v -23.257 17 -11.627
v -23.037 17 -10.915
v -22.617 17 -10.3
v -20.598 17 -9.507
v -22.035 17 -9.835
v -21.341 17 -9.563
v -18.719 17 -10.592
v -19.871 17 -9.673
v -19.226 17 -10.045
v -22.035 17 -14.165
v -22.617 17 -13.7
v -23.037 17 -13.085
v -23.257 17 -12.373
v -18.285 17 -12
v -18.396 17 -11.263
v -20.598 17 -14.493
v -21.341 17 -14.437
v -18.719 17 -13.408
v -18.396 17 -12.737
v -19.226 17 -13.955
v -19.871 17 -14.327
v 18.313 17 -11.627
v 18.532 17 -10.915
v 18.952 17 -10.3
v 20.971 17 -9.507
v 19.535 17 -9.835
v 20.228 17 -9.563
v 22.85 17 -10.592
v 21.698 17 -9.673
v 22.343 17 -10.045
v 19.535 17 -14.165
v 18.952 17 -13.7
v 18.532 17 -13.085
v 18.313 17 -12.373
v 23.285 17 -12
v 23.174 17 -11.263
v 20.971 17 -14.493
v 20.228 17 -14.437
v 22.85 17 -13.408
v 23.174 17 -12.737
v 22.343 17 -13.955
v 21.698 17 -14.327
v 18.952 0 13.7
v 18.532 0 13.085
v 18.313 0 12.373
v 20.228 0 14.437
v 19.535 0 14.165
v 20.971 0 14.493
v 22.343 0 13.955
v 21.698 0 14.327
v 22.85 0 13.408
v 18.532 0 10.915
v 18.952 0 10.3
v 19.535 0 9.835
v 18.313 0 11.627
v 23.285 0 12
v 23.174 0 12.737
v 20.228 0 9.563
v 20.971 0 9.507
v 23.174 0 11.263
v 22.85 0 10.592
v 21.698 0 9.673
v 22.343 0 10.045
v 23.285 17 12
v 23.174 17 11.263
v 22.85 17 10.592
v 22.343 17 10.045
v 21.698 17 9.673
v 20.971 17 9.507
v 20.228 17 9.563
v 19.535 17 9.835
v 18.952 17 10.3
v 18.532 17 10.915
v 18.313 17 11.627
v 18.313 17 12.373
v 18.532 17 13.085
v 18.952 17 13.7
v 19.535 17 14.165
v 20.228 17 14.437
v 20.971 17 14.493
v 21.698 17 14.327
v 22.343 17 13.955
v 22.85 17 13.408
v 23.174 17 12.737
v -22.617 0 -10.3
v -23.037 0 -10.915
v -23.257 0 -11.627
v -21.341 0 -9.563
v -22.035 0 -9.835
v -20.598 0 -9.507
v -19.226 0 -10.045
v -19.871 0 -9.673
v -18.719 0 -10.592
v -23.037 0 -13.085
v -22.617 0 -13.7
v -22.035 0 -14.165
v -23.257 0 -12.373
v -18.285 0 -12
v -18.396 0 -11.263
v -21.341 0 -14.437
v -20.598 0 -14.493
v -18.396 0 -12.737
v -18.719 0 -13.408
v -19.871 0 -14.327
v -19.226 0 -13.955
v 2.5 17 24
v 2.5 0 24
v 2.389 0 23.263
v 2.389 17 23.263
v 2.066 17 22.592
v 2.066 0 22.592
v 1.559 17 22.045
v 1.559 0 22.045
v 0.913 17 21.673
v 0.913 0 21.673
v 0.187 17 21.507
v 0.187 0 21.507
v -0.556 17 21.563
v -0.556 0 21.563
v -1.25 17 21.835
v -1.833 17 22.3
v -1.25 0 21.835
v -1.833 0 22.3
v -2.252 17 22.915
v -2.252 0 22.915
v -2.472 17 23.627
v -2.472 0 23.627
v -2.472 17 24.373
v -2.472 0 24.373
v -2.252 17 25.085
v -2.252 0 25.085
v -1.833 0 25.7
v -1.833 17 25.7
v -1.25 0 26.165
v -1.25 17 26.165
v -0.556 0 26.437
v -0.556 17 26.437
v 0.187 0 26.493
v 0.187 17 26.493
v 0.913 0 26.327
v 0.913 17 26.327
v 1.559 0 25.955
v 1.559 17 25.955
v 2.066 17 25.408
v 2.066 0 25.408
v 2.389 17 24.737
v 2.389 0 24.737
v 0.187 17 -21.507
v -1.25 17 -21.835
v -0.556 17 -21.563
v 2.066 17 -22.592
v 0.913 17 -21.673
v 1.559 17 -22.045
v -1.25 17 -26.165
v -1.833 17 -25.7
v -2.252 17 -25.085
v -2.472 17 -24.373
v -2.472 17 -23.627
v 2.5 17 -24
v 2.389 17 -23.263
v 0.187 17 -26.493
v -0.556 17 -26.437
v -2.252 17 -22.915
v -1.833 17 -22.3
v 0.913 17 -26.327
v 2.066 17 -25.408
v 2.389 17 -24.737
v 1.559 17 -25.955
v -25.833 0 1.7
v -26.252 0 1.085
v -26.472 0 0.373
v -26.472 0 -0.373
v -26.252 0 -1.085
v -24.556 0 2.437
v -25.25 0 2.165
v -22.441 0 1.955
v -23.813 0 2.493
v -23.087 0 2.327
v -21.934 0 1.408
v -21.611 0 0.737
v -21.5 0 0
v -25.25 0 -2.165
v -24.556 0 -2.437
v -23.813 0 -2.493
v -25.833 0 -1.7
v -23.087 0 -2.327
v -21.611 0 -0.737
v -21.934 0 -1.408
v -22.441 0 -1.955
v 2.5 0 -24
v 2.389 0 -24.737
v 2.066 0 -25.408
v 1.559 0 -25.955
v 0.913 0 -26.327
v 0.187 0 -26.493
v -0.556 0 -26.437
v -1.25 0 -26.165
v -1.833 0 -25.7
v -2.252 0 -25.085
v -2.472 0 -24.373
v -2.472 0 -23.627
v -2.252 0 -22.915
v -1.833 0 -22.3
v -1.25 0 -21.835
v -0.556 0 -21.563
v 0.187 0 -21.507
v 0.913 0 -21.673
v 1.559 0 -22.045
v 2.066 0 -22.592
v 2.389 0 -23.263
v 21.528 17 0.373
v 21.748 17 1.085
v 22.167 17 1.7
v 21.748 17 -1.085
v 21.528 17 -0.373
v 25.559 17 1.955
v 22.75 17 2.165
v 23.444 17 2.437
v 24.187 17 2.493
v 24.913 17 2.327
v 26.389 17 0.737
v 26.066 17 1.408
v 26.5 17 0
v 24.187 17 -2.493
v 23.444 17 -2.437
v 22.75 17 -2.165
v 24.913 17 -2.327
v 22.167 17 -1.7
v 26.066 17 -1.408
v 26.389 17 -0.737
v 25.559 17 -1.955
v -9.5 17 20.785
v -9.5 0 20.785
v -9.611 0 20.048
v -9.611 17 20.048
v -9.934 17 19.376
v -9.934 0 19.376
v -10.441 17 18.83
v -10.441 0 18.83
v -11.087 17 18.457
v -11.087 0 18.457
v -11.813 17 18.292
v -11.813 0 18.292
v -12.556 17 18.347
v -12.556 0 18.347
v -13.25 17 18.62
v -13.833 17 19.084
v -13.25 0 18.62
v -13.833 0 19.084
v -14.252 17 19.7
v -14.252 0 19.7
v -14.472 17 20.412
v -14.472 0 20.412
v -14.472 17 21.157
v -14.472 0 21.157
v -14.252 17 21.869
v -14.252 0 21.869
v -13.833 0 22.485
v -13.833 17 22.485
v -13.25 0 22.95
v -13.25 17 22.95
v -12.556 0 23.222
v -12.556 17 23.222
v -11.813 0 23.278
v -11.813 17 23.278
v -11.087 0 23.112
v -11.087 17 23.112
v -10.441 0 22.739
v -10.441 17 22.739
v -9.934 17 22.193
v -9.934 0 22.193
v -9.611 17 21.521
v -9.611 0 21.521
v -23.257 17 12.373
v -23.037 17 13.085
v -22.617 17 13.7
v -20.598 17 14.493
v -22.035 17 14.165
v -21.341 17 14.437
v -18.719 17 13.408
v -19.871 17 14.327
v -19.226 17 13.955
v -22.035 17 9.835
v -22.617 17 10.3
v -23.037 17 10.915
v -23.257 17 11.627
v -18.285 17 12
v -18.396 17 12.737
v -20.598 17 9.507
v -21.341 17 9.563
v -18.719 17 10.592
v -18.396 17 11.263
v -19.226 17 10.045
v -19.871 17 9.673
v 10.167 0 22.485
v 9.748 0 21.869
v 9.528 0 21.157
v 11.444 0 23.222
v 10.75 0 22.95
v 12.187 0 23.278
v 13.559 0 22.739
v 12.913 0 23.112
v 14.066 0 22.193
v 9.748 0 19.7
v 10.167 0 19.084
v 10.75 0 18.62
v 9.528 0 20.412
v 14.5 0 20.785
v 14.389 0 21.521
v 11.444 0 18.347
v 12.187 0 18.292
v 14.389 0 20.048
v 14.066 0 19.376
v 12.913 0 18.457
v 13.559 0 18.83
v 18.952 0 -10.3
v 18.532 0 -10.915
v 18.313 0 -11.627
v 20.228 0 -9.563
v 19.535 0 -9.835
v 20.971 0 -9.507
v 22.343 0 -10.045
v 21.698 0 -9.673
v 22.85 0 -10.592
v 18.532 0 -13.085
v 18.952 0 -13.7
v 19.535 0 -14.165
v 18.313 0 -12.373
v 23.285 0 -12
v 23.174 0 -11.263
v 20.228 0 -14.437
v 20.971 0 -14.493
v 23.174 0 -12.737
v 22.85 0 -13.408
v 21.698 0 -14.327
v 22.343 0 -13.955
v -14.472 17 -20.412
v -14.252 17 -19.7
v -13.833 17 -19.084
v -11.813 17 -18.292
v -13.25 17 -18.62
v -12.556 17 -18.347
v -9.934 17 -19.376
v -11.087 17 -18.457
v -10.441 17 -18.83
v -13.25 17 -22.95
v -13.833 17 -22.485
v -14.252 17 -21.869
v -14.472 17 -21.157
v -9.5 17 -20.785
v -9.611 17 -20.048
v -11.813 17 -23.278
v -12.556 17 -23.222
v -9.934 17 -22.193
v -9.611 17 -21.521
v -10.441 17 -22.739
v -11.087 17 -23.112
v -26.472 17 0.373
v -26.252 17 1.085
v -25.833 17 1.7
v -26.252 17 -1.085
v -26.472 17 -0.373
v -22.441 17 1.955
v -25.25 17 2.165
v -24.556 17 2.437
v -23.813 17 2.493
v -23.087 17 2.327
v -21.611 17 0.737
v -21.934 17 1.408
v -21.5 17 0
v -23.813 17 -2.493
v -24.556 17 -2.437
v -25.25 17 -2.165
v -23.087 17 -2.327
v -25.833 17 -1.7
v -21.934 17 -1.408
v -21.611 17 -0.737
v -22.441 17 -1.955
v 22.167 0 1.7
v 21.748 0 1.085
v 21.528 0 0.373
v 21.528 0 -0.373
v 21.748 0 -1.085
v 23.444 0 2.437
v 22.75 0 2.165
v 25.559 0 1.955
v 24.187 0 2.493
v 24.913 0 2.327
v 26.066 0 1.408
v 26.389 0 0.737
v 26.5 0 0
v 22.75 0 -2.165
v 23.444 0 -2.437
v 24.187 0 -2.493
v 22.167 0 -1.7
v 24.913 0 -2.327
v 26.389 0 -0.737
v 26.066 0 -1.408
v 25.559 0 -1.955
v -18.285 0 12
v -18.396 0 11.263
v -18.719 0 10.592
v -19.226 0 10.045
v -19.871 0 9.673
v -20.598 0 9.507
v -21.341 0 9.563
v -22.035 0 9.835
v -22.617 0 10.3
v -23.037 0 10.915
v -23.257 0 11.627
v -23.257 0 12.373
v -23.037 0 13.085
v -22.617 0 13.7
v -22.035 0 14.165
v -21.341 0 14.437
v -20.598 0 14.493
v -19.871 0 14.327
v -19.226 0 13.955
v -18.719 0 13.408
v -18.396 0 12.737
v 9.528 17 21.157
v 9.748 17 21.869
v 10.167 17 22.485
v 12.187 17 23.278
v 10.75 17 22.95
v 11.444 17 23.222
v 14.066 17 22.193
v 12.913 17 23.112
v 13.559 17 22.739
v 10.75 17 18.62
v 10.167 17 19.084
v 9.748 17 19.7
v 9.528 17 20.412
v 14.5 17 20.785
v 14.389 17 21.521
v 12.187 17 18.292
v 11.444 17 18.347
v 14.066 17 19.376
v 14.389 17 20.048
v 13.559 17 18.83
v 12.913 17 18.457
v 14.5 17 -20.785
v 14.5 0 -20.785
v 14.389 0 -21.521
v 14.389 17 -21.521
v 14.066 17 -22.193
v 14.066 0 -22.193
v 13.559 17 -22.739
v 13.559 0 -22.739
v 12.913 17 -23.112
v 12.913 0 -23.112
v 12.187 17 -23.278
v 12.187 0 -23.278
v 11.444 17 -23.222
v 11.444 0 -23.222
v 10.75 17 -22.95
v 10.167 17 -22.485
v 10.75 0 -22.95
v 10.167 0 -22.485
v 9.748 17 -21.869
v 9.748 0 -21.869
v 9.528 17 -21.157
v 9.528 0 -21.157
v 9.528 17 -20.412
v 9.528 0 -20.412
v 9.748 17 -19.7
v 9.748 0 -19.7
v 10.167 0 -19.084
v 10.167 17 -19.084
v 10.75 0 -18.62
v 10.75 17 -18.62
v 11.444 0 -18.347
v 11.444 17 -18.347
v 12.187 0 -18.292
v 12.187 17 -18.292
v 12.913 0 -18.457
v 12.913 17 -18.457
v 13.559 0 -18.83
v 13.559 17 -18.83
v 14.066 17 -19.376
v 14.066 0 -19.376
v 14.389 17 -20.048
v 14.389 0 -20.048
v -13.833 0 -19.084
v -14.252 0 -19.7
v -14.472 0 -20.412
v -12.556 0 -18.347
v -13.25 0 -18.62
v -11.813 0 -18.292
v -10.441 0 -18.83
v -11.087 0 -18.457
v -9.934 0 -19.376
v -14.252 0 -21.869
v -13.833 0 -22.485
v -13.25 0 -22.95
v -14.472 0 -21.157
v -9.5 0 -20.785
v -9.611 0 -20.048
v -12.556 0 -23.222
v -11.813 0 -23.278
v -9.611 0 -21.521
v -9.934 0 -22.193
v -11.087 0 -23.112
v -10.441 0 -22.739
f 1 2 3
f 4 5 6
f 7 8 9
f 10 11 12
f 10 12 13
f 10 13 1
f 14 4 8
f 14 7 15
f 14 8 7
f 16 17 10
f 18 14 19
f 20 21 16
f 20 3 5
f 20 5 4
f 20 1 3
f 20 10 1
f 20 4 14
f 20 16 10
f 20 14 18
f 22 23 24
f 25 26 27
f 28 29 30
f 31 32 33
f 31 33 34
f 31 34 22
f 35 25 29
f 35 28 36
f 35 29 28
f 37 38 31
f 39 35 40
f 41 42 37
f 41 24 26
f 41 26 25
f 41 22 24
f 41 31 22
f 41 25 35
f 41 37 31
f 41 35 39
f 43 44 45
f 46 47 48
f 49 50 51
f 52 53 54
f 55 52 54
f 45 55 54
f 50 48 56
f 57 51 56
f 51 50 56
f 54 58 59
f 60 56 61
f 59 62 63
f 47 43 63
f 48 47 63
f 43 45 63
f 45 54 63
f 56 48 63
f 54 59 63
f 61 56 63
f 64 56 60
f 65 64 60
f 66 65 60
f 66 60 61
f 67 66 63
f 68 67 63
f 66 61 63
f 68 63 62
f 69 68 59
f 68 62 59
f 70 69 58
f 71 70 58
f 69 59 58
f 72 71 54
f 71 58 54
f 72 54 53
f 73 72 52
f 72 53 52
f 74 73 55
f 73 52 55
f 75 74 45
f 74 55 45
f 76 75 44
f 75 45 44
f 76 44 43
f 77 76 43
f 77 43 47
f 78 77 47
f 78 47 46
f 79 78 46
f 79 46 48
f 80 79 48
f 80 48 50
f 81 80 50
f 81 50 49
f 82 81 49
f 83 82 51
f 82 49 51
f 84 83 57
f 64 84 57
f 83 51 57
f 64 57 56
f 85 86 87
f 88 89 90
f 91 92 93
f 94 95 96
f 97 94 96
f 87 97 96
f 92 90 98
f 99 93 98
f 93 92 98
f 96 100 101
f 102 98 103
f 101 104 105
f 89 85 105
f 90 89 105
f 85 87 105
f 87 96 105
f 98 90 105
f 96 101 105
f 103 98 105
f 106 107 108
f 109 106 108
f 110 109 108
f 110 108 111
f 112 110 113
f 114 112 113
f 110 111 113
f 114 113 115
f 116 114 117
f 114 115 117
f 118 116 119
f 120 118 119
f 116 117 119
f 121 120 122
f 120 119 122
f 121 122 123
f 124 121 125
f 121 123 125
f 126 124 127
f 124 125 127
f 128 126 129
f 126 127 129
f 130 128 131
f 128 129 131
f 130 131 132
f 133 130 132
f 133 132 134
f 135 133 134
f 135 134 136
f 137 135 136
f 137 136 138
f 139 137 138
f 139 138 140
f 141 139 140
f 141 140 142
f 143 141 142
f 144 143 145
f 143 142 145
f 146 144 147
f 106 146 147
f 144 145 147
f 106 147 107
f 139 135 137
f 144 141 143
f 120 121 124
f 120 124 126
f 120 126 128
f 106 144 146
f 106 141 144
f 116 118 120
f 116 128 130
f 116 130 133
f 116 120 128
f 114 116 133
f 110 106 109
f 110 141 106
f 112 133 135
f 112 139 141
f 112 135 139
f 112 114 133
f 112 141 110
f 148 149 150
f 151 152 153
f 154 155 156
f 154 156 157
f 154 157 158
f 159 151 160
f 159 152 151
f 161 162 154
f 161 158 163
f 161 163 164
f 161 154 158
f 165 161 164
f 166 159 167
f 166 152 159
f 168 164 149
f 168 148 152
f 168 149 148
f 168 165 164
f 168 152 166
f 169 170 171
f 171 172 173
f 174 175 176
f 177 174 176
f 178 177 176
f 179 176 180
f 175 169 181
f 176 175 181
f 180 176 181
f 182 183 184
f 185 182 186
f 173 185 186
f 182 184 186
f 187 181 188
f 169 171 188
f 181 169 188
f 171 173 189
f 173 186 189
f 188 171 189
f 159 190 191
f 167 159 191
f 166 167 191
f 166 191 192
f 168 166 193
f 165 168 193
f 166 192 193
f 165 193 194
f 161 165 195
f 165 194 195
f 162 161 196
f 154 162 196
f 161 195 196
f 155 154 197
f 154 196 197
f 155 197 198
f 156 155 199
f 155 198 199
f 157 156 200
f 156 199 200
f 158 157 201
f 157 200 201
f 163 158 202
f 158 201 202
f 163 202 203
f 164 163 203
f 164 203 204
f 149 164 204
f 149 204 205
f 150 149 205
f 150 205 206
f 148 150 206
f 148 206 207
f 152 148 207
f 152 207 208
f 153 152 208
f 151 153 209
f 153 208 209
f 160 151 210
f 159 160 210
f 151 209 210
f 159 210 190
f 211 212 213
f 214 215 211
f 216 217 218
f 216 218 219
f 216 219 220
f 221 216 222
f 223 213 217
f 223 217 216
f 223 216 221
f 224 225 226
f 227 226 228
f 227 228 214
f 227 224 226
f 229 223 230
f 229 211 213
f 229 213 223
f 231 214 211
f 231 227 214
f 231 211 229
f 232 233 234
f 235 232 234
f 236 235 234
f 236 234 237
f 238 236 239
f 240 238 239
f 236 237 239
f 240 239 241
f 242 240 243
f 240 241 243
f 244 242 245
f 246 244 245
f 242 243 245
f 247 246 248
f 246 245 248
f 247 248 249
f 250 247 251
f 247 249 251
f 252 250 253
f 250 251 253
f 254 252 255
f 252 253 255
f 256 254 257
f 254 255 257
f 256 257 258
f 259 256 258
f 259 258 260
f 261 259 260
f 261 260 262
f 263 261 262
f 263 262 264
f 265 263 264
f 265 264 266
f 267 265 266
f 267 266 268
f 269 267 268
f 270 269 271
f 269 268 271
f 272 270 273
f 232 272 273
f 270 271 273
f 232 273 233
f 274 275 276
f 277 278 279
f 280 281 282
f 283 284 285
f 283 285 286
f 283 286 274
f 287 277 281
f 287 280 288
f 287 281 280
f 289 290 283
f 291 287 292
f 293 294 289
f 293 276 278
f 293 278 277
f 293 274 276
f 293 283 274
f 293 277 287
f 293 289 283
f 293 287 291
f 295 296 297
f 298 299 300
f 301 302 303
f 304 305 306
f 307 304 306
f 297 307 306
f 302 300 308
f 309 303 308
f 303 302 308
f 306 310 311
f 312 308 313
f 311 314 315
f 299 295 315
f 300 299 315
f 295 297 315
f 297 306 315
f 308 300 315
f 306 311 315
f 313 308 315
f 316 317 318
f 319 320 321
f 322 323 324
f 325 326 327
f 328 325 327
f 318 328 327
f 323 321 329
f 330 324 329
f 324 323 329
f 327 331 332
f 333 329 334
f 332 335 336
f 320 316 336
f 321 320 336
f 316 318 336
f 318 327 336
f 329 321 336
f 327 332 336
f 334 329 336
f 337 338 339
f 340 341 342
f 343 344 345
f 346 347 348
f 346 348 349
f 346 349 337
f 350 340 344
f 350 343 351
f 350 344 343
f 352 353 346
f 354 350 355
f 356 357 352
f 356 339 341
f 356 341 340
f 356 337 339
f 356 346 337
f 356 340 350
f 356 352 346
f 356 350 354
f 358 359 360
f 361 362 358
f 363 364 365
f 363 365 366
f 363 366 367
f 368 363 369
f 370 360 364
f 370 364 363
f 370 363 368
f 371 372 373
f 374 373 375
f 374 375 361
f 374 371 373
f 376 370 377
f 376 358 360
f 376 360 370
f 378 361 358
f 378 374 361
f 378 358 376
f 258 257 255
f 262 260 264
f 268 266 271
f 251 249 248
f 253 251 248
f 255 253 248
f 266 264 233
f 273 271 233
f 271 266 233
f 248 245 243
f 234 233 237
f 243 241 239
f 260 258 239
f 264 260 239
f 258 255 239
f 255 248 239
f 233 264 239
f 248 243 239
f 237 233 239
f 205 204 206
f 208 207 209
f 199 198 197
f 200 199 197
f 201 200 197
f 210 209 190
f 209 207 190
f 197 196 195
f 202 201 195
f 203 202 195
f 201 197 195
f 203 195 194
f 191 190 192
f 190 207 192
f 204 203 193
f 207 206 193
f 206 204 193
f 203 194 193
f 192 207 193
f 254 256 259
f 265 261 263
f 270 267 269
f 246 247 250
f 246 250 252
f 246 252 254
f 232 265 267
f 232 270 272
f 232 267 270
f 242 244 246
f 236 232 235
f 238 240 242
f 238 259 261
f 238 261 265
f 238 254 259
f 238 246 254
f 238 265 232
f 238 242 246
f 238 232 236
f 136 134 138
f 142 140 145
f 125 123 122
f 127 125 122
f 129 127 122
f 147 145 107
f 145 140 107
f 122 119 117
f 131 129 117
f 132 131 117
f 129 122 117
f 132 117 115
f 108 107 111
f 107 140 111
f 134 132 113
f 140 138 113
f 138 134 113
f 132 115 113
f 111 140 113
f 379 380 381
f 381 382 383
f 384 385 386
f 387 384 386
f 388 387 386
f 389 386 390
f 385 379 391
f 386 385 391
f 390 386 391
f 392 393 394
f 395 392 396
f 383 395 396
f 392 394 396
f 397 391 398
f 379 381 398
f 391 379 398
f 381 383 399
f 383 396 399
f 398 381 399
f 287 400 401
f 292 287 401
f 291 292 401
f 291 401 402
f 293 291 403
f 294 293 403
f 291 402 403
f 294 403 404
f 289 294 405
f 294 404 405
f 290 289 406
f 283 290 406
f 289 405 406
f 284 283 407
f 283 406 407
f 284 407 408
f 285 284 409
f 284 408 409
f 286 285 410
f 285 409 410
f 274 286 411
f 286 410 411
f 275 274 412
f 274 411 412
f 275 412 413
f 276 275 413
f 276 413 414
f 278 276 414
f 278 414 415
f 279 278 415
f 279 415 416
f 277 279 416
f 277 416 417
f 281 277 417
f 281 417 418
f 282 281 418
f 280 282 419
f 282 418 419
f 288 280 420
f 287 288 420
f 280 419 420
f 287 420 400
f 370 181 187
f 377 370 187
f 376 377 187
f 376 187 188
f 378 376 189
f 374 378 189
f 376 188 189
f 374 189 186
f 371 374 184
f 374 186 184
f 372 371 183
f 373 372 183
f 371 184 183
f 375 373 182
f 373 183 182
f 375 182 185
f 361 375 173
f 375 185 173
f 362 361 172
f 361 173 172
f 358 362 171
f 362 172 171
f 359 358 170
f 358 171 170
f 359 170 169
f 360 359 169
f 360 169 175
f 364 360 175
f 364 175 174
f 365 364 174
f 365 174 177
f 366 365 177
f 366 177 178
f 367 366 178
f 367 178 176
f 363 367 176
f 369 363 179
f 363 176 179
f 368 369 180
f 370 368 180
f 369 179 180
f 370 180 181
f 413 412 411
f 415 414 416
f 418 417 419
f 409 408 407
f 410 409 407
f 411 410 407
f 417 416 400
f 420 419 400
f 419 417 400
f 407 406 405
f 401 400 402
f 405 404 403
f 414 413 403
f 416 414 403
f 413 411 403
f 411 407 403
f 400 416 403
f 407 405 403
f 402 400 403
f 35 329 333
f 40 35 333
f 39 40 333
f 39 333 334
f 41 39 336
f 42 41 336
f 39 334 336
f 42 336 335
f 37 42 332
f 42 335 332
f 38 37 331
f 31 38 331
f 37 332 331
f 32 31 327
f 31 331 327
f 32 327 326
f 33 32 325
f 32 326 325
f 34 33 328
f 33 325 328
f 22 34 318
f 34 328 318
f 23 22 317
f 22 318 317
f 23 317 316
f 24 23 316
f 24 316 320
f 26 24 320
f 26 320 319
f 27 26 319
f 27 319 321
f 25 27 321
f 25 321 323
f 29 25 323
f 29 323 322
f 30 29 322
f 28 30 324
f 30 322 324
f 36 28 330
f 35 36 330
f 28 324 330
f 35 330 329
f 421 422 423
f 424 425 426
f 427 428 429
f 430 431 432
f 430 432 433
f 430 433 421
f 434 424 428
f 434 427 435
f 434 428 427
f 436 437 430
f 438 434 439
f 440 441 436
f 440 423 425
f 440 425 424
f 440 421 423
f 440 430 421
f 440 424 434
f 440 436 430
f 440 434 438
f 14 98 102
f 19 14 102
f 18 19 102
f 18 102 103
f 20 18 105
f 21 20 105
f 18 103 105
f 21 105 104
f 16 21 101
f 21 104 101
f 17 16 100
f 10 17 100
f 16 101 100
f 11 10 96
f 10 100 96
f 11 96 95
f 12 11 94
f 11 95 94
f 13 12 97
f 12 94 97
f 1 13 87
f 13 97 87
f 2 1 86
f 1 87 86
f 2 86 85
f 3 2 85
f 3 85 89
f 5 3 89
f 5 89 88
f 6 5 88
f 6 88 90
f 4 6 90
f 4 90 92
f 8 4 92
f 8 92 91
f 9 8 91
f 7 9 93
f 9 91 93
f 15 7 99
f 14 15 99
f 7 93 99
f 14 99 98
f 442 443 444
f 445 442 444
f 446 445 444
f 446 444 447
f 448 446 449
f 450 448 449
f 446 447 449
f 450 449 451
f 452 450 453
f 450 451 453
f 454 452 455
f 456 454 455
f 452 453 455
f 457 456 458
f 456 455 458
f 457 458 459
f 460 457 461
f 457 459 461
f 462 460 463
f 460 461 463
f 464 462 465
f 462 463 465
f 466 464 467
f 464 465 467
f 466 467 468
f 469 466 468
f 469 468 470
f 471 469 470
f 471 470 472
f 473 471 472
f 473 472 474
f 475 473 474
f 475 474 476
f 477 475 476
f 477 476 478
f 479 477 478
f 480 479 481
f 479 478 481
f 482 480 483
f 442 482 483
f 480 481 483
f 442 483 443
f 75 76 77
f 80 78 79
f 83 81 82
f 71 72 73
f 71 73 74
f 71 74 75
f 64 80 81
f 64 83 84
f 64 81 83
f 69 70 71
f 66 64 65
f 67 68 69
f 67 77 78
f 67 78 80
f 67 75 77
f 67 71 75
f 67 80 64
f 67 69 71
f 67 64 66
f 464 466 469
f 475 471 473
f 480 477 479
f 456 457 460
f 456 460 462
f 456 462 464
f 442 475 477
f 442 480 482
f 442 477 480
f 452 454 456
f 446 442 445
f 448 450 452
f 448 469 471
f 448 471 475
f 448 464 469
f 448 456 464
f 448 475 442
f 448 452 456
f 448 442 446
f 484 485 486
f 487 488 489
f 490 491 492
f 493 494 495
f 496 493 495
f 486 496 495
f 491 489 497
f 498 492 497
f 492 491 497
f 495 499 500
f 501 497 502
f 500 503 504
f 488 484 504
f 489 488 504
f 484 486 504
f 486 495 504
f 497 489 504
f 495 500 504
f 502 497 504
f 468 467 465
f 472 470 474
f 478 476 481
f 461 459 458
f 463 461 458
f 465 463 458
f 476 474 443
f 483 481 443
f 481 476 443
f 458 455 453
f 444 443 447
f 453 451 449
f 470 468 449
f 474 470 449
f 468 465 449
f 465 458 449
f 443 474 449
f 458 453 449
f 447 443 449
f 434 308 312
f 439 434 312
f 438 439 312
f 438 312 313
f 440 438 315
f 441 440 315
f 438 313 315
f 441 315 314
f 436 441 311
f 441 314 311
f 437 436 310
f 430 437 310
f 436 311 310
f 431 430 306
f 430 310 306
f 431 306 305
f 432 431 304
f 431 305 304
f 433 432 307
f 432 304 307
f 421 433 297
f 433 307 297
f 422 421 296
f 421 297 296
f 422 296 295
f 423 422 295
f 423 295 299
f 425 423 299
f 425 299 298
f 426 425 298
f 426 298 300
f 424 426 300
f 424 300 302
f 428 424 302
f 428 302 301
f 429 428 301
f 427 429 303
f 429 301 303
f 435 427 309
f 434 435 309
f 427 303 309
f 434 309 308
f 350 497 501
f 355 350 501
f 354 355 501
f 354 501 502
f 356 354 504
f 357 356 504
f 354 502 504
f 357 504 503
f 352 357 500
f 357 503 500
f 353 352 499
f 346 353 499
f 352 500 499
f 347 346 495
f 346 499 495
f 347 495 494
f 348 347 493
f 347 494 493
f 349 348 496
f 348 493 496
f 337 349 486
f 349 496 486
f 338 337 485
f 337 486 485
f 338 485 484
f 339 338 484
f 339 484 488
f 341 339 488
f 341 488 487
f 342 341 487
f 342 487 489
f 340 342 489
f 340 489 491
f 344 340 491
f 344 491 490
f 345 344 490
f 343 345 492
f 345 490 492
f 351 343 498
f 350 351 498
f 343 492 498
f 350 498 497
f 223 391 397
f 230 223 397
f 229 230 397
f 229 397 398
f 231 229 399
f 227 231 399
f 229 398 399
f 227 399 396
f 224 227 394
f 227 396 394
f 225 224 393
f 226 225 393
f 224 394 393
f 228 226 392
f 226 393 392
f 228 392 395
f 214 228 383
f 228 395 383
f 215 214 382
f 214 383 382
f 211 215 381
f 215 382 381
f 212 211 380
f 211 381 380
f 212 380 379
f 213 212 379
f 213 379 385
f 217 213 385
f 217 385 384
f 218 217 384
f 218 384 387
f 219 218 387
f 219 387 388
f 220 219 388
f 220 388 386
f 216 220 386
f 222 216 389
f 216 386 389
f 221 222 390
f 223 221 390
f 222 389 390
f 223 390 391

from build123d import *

# Parameters (mm, degrees)
SKETCH1_R              = 2.5
BOSS_EXTRUDE1_DEPTH    = 17
BOSS_EXTRUDE1_2_DEPTH  = 17
BOSS_EXTRUDE1_3_DEPTH  = 17
BOSS_EXTRUDE1_4_DEPTH  = 17
BOSS_EXTRUDE1_5_DEPTH  = 17
BOSS_EXTRUDE1_6_DEPTH  = 17
BOSS_EXTRUDE1_7_DEPTH  = 17
BOSS_EXTRUDE1_8_DEPTH  = 17
BOSS_EXTRUDE1_9_DEPTH  = 17
BOSS_EXTRUDE1_10_DEPTH = 17
BOSS_EXTRUDE1_11_DEPTH = 17
BOSS_EXTRUDE1_12_DEPTH = 17


with BuildPart() as part:
    # Sketch1 → Boss-Extrude1 (new body)
    with BuildSketch(Plane(origin=(0, 0, 0), x_dir=(1, 0, 0), z_dir=(0, 1, 0))):
        with Locations((0, 24)):
            Circle(SKETCH1_R)
    extrude(amount=BOSS_EXTRUDE1_DEPTH)


with BuildPart() as body_2:
    # Sketch1 → Boss-Extrude1 2 (new body)
    with BuildSketch(Plane(origin=(0, 0, 0), x_dir=(1, 0, 0), z_dir=(0, 1, 0))):
        with Locations((12, 20.784609691)):
            Circle(SKETCH1_R)
    extrude(amount=BOSS_EXTRUDE1_2_DEPTH)


with BuildPart() as body_3:
    # Sketch1 → Boss-Extrude1 3 (new body)
    with BuildSketch(Plane(origin=(0, 0, 0), x_dir=(1, 0, 0), z_dir=(0, 1, 0))):
        with Locations((20.784609691, 12)):
            Circle(SKETCH1_R)
    extrude(amount=BOSS_EXTRUDE1_3_DEPTH)


with BuildPart() as body_4:
    # Sketch1 → Boss-Extrude1 4 (new body)
    with BuildSketch(Plane(origin=(0, 0, 0), x_dir=(1, 0, 0), z_dir=(0, 1, 0))):
        with Locations((24, 0)):
            Circle(SKETCH1_R)
    extrude(amount=BOSS_EXTRUDE1_4_DEPTH)


with BuildPart() as body_5:
    # Sketch1 → Boss-Extrude1 5 (new body)
    with BuildSketch(Plane(origin=(0, 0, 0), x_dir=(1, 0, 0), z_dir=(0, 1, 0))):
        with Locations((20.784609691, -12)):
            Circle(SKETCH1_R)
    extrude(amount=BOSS_EXTRUDE1_5_DEPTH)


with BuildPart() as body_6:
    # Sketch1 → Boss-Extrude1 6 (new body)
    with BuildSketch(Plane(origin=(0, 0, 0), x_dir=(1, 0, 0), z_dir=(0, 1, 0))):
        with Locations((12, -20.784609691)):
            Circle(SKETCH1_R)
    extrude(amount=BOSS_EXTRUDE1_6_DEPTH)


with BuildPart() as body_7:
    # Sketch1 → Boss-Extrude1 7 (new body)
    with BuildSketch(Plane(origin=(0, 0, 0), x_dir=(1, 0, 0), z_dir=(0, 1, 0))):
        with Locations((0, -24)):
            Circle(SKETCH1_R)
    extrude(amount=BOSS_EXTRUDE1_7_DEPTH)


with BuildPart() as body_8:
    # Sketch1 → Boss-Extrude1 8 (new body)
    with BuildSketch(Plane(origin=(0, 0, 0), x_dir=(1, 0, 0), z_dir=(0, 1, 0))):
        with Locations((-12, -20.784609691)):
            Circle(SKETCH1_R)
    extrude(amount=BOSS_EXTRUDE1_8_DEPTH)


with BuildPart() as body_9:
    # Sketch1 → Boss-Extrude1 9 (new body)
    with BuildSketch(Plane(origin=(0, 0, 0), x_dir=(1, 0, 0), z_dir=(0, 1, 0))):
        with Locations((-20.784609691, -12)):
            Circle(SKETCH1_R)
    extrude(amount=BOSS_EXTRUDE1_9_DEPTH)


with BuildPart() as body_10:
    # Sketch1 → Boss-Extrude1 10 (new body)
    with BuildSketch(Plane(origin=(0, 0, 0), x_dir=(1, 0, 0), z_dir=(0, 1, 0))):
        with Locations((-24, 0)):
            Circle(SKETCH1_R)
    extrude(amount=BOSS_EXTRUDE1_10_DEPTH)


with BuildPart() as body_11:
    # Sketch1 → Boss-Extrude1 11 (new body)
    with BuildSketch(Plane(origin=(0, 0, 0), x_dir=(1, 0, 0), z_dir=(0, 1, 0))):
        with Locations((-20.784609691, 12)):
            Circle(SKETCH1_R)
    extrude(amount=BOSS_EXTRUDE1_11_DEPTH)


with BuildPart() as body_12:
    # Sketch1 → Boss-Extrude1 12 (new body)
    with BuildSketch(Plane(origin=(0, 0, 0), x_dir=(1, 0, 0), z_dir=(0, 1, 0))):
        with Locations((-12, 20.784609691)):
            Circle(SKETCH1_R)
    extrude(amount=BOSS_EXTRUDE1_12_DEPTH)


solid = Compound([part.part, body_2.part, body_3.part, body_4.part, body_5.part, body_6.part, body_7.part, body_8.part, body_9.part, body_10.part, body_11.part, body_12.part])
